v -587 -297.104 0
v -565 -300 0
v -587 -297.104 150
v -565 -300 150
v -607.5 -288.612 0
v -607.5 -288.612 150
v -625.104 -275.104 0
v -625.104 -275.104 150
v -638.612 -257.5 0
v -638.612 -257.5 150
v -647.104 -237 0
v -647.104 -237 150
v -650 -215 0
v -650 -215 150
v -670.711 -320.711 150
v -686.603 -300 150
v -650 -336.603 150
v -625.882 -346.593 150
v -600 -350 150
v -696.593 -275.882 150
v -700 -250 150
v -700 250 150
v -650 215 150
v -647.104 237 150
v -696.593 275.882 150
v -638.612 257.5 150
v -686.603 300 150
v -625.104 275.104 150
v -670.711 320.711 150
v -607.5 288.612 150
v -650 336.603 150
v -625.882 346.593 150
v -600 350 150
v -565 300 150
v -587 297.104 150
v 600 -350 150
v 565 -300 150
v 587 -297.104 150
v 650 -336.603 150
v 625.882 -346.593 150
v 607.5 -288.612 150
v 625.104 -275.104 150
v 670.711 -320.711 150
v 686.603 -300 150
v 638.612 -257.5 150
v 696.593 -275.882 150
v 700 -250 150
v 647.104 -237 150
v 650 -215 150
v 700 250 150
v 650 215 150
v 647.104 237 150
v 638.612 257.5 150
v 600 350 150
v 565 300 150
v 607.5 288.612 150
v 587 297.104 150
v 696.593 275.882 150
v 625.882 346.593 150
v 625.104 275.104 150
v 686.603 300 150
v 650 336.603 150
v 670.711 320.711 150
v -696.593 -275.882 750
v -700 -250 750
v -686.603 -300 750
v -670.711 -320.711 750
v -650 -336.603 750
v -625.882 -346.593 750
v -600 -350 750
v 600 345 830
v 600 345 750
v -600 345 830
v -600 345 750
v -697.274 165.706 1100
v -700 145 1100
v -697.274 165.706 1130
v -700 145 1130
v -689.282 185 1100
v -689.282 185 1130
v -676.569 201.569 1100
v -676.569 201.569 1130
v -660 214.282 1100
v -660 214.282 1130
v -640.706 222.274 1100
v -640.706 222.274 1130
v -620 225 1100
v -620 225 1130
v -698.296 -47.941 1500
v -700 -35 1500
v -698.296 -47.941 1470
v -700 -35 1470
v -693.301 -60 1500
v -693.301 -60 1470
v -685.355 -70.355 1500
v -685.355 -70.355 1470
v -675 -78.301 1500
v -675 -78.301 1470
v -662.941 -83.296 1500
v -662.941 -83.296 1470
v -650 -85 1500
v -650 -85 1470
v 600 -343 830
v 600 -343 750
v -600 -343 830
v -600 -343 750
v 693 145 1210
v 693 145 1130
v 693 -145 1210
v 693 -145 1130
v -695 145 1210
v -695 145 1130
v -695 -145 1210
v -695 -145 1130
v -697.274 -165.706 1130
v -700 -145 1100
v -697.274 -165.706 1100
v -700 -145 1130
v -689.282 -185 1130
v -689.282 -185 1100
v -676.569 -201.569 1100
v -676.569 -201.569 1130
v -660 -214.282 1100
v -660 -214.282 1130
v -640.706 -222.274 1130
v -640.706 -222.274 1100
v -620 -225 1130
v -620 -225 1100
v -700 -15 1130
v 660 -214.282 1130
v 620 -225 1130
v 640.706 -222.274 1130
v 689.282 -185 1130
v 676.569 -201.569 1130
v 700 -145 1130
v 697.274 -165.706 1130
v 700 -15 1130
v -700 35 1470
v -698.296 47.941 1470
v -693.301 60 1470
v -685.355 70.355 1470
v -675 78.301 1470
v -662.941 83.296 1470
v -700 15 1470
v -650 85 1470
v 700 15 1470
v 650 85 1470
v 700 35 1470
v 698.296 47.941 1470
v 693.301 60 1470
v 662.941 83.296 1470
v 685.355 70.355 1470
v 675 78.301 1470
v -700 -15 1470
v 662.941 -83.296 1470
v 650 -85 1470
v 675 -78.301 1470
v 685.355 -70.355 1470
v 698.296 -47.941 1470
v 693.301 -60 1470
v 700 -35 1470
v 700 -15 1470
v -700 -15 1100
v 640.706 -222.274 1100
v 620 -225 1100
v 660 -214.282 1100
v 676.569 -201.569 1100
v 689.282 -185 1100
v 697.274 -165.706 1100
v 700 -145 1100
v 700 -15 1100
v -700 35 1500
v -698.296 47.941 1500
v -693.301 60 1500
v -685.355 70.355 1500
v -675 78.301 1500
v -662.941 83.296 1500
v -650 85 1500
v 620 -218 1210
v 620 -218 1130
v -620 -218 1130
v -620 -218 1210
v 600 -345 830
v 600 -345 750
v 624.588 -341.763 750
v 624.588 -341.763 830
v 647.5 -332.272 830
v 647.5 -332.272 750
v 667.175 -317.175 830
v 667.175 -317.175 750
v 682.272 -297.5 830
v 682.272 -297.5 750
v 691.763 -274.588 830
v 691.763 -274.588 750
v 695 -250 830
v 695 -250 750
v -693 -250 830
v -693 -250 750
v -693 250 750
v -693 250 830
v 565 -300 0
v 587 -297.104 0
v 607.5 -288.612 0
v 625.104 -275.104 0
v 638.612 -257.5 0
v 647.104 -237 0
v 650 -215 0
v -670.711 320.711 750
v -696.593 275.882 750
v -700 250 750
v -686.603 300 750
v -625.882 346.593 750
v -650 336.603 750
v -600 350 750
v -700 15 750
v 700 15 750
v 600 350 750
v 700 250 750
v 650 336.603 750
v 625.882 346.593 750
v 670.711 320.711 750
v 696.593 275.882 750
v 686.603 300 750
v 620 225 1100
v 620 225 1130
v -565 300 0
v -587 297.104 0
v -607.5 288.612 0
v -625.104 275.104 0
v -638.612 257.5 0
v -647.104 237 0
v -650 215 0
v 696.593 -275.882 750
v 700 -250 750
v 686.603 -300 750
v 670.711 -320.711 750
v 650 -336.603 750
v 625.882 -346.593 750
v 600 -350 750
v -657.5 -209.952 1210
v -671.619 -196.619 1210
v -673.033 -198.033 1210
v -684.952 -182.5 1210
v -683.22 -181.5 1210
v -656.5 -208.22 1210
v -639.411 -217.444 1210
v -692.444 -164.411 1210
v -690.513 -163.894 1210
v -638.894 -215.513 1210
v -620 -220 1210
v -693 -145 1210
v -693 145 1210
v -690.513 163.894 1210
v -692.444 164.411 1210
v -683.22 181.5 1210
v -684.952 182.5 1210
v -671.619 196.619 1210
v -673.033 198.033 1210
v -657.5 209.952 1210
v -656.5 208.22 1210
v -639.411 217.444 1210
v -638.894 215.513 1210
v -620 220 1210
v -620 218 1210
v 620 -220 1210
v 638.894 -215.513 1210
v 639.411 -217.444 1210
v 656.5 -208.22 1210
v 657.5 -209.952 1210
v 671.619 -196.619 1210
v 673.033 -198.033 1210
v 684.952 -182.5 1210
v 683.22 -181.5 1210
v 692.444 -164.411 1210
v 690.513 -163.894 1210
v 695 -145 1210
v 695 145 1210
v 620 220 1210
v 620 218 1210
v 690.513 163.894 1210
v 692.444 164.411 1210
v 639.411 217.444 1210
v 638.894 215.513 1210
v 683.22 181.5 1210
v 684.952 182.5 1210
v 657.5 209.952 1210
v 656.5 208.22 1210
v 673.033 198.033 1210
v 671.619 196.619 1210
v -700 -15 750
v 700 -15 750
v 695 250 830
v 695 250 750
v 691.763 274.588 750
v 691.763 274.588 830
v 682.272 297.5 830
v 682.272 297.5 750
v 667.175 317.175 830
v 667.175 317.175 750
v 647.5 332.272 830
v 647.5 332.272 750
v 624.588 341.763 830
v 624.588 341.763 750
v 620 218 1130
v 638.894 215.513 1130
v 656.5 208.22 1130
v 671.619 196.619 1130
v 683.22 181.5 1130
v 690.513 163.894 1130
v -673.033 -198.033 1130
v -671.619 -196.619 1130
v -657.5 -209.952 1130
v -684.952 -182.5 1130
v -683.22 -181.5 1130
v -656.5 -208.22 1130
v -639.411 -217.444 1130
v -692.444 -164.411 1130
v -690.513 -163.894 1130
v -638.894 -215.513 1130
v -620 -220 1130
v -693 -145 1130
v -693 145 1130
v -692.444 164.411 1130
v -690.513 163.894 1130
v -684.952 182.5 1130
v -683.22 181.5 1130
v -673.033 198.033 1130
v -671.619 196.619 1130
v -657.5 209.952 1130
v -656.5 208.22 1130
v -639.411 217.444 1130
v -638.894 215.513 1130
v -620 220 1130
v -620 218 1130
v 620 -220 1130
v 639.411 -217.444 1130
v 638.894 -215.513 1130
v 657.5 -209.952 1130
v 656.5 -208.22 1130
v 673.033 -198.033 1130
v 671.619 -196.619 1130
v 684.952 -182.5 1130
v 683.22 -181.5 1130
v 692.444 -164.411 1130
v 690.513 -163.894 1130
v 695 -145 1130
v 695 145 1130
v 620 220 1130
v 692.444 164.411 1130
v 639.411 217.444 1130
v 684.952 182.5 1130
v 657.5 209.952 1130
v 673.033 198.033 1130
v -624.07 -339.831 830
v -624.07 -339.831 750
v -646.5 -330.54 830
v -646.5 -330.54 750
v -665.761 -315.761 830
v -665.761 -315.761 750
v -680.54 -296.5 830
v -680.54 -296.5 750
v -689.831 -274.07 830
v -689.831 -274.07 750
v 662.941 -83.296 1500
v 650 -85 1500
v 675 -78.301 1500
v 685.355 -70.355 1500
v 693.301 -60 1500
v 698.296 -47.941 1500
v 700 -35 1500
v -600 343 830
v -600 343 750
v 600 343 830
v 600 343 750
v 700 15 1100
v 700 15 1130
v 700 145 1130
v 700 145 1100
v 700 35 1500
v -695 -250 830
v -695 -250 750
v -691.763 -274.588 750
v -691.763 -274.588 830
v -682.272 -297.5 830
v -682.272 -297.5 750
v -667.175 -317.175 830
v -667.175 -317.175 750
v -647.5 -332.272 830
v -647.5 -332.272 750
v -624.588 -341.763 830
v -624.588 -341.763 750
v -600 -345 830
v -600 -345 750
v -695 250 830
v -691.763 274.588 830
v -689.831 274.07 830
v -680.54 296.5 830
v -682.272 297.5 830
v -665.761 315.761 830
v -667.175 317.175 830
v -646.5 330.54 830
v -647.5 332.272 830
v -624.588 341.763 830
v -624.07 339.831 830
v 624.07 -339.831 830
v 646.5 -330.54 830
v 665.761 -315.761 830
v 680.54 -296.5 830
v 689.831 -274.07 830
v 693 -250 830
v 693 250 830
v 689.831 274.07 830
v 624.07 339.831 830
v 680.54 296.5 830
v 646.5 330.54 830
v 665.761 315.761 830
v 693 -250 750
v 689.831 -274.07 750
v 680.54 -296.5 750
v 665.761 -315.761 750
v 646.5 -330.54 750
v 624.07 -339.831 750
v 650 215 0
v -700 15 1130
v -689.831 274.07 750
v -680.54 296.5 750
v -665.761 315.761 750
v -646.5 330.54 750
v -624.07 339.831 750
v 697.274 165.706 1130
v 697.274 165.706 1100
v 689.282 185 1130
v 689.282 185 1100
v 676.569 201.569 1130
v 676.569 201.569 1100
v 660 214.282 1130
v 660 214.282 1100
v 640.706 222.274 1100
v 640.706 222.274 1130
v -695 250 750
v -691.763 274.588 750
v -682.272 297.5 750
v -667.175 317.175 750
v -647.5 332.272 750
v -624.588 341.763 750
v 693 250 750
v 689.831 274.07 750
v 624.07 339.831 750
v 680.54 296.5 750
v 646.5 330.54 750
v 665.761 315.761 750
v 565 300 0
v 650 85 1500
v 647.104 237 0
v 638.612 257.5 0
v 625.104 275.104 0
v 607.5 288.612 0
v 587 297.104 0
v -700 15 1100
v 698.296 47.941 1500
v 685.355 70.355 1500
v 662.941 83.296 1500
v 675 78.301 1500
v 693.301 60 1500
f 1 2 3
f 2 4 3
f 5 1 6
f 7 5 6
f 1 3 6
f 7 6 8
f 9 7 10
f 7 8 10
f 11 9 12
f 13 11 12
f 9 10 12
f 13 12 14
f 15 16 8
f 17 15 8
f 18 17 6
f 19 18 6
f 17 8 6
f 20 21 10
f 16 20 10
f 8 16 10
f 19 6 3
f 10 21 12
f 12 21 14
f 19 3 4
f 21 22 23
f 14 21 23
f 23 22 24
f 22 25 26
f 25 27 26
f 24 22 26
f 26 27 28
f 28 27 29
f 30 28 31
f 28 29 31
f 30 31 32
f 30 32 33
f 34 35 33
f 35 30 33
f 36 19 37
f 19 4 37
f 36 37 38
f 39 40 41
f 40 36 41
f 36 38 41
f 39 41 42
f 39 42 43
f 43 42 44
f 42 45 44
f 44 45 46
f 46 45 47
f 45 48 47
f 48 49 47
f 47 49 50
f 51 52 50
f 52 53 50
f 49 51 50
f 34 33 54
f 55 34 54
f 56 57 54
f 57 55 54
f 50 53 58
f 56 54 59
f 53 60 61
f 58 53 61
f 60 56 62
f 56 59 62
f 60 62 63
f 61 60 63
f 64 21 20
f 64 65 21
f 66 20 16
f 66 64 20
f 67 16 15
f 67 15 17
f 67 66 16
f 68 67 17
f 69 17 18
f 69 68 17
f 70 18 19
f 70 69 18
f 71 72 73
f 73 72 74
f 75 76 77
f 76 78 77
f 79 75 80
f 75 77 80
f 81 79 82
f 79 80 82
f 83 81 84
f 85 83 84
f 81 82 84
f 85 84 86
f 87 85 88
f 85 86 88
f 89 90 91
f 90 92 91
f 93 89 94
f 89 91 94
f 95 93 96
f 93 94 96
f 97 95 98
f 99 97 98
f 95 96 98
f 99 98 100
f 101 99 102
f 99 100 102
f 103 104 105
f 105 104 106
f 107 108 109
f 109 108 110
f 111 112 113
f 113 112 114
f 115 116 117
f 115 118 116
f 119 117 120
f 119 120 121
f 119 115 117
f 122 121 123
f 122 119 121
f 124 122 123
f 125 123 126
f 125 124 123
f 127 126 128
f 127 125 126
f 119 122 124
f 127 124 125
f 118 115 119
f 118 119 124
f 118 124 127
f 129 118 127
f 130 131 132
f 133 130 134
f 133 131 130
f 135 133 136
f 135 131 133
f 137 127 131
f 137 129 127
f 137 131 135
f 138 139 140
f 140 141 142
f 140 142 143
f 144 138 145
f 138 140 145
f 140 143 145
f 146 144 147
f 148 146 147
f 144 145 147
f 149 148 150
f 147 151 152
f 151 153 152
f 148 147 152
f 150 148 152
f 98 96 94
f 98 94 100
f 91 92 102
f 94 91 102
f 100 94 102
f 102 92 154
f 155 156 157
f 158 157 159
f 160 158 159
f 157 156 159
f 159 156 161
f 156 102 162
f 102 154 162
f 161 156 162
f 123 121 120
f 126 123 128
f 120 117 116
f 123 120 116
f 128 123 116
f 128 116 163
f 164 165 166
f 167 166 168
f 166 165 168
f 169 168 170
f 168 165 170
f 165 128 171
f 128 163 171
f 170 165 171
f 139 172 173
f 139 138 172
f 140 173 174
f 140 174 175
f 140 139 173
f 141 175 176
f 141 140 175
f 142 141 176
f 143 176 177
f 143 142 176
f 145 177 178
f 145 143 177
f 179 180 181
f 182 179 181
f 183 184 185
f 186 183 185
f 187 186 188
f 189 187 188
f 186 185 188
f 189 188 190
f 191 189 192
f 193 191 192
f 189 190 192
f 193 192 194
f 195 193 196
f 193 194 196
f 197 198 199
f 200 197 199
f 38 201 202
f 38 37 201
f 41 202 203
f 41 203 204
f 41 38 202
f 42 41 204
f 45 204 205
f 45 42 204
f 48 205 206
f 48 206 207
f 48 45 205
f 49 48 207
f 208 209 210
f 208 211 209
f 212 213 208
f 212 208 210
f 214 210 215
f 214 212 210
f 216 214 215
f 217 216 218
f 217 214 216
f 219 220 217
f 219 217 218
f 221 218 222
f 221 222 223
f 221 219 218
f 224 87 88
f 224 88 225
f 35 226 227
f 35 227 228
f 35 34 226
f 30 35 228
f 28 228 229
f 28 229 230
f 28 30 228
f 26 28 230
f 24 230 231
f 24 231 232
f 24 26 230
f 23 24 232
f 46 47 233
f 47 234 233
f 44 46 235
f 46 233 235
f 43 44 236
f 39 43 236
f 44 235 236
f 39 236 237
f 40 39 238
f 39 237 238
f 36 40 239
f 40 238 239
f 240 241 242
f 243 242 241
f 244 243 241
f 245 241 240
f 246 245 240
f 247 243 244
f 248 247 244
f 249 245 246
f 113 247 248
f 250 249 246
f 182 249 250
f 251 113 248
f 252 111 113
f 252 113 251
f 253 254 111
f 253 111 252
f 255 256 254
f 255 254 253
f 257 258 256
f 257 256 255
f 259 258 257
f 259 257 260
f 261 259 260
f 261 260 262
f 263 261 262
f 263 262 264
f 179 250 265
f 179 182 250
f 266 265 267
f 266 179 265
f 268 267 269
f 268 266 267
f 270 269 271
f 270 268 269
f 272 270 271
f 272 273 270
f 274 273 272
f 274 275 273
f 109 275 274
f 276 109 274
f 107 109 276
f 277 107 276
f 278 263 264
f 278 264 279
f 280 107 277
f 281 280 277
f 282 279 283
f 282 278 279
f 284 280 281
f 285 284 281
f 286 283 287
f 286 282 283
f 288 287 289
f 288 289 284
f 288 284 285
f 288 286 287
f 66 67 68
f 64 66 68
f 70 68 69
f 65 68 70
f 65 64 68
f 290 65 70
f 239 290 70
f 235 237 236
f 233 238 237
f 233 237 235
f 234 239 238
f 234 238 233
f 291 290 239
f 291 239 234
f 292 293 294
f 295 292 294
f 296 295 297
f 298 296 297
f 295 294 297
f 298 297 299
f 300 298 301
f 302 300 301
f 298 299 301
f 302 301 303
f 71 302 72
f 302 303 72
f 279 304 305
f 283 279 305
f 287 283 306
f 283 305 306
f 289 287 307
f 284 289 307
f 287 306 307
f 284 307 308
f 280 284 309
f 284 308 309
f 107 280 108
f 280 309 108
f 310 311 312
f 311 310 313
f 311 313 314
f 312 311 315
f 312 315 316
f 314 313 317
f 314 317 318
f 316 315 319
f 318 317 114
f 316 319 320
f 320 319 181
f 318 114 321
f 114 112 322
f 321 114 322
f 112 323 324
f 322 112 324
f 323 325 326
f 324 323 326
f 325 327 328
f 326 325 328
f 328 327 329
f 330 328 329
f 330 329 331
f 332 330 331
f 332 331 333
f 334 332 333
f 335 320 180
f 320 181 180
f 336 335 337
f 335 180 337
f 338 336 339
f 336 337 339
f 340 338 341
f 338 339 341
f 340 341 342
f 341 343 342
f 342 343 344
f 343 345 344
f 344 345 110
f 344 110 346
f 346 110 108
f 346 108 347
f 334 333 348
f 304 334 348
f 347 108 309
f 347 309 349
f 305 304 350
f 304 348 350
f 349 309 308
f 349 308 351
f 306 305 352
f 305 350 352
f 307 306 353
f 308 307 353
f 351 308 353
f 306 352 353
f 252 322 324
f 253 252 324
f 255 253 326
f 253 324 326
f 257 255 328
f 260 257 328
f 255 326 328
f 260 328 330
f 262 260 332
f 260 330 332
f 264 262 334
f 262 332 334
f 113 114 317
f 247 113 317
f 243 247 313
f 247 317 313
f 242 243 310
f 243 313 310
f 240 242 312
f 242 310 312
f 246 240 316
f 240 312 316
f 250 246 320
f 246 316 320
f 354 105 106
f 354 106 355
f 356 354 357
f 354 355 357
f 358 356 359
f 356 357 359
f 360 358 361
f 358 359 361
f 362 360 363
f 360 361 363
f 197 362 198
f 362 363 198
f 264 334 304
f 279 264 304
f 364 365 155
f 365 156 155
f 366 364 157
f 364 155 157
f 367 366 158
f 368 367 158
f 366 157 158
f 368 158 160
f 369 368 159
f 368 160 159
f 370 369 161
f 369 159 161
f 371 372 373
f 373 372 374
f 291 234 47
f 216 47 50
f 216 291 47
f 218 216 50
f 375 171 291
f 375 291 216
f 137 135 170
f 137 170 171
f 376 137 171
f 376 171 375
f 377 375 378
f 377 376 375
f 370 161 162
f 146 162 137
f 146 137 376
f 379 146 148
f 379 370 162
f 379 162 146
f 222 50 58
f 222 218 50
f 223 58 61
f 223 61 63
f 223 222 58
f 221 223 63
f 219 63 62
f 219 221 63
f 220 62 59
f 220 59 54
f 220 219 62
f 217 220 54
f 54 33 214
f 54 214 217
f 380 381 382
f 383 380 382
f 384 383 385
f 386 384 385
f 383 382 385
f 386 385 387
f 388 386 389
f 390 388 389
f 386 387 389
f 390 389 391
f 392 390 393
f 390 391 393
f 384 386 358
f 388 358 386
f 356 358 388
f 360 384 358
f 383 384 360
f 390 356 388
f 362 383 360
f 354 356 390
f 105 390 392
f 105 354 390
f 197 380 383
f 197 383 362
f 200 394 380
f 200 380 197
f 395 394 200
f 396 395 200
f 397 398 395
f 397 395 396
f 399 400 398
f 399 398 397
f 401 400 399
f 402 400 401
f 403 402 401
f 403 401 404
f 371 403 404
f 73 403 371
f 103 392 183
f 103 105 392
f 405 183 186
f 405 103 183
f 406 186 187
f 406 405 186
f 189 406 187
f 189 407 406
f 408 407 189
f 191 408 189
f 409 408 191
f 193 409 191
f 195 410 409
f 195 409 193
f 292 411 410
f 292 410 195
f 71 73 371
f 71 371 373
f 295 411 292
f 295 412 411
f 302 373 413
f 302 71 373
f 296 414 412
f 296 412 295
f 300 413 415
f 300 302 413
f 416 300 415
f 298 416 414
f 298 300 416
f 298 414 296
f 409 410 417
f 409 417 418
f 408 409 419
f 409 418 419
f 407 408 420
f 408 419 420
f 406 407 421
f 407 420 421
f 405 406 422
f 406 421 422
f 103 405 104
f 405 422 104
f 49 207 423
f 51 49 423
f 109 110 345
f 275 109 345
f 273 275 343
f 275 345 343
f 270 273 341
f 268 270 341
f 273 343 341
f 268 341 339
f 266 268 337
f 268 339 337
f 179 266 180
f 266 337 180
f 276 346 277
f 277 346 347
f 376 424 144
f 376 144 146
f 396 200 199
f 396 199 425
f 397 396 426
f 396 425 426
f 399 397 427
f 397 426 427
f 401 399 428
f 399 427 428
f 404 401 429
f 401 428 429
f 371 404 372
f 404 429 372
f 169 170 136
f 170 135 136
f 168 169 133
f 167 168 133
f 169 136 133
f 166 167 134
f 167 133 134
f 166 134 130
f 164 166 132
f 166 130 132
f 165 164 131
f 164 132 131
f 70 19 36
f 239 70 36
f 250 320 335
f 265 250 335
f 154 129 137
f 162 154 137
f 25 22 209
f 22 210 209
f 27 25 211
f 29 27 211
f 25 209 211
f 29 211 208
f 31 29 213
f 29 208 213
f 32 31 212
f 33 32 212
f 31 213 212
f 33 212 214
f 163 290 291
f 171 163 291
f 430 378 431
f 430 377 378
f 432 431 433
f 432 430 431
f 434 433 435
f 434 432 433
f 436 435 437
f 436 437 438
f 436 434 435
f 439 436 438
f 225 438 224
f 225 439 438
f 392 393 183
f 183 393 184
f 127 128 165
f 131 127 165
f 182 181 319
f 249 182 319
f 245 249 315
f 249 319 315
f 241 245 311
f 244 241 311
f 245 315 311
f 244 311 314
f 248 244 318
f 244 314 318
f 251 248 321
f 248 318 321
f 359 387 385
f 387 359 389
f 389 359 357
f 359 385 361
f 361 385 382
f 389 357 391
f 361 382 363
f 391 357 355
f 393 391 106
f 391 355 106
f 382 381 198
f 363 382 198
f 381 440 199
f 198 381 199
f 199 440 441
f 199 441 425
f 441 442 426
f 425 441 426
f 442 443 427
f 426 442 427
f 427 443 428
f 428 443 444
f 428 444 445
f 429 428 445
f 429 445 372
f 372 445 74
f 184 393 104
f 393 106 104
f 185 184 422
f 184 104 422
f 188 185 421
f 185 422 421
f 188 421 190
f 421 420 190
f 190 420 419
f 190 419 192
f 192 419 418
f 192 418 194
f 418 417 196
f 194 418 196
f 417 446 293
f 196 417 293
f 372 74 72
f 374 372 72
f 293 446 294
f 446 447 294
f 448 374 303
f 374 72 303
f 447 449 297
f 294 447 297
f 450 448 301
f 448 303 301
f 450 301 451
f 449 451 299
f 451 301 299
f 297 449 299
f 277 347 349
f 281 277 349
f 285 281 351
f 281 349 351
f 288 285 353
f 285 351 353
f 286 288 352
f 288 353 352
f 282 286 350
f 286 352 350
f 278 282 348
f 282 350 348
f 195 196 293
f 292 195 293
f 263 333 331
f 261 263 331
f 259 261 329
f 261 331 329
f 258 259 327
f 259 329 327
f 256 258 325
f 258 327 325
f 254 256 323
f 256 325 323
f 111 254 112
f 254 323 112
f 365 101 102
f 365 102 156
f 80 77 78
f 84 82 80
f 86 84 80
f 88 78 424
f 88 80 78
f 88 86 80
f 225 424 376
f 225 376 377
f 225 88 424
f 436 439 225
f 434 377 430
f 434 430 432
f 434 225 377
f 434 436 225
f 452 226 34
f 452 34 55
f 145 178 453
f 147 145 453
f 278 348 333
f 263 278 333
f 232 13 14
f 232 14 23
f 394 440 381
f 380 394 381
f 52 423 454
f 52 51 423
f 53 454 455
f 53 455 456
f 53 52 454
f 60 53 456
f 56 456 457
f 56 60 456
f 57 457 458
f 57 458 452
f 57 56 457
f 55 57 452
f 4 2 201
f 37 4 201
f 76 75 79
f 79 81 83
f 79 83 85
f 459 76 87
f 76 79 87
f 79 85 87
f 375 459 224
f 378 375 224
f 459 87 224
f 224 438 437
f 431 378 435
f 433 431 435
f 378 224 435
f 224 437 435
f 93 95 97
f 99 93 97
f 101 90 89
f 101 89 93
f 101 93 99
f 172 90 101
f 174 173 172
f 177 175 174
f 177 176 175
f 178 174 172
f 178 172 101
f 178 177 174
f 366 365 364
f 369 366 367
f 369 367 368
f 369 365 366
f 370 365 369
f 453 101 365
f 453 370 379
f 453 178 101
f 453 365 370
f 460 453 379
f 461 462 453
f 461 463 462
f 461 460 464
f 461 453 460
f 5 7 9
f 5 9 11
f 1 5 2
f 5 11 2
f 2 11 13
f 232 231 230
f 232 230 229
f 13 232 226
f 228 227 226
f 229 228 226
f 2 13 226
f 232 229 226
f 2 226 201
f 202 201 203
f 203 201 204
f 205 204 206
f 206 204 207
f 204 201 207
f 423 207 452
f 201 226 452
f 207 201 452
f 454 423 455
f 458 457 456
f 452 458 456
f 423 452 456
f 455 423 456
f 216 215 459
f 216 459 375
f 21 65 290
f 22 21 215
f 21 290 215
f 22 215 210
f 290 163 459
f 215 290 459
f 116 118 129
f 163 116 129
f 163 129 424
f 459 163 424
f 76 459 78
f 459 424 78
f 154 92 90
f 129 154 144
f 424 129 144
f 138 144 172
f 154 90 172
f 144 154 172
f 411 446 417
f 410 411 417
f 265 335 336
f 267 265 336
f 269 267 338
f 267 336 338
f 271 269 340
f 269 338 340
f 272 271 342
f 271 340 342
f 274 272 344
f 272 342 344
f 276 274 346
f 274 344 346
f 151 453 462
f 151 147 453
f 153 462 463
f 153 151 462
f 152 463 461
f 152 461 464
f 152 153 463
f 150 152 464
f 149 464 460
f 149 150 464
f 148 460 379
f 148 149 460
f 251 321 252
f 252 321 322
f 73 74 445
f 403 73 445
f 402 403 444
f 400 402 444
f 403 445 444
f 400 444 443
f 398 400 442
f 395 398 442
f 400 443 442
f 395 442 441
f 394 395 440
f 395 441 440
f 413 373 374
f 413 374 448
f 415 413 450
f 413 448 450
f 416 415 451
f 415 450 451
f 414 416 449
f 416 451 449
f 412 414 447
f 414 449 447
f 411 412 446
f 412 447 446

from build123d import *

# Parameters (mm, degrees)
F2_W      = 1300
F2_H      = 600
F3_DEPTH  = 150
F4_W      = 1400
F4_H      = 700
F5_DEPTH  = 600
F6_W      = 1400
F6_H      = 30
F7_DEPTH  = 750
F9_W      = 1400
F9_H      = 450
F10_DEPTH = 30
F11_W     = 1400
F11_H     = 170
F12_DEPTH = 30
F13_R     = 100
F14_R     = 85
F15_R     = 80
F16_R     = 50
F18_DEPTH = 80
F20_DEPTH = 80


with BuildPart() as f3:
    # F2 (on Top) → F3 (new body, through all)
    with BuildSketch(Plane.XY):
        Rectangle(F2_W, F2_H)
    extrude(amount=F3_DEPTH)

    # F4 (on face) → F5 (join, through all)
    with BuildSketch(Plane.XY.offset(150)):
        Rectangle(F4_W, F4_H)
    extrude(amount=F5_DEPTH)

    # F6 (on face) → F7 (join, through all)
    with BuildSketch(Plane.XY.offset(750)):
        Rectangle(F6_W, F6_H)
    extrude(amount=F7_DEPTH)

    # F9 (on plane+point) → F10 (join, through all)
    with BuildSketch(Plane.XY.offset(1100)):
        Rectangle(F9_W, F9_H)
    extrude(amount=F10_DEPTH)

    # F11 (on face) → F12 (join, through all)
    with BuildSketch(Plane.XY.offset(1500)):
        Rectangle(F11_W, F11_H)
    extrude(amount=-F12_DEPTH)

    # F13
    f13_edges = [f3.edges().sort_by_distance(p)[0] for p in [
        (700, -350, 450),
        (-700, -350, 450),
        (700, 350, 450),
        (-700, 350, 450),
    ]]
    fillet(f13_edges, radius=F13_R)

    # F14
    f14_edges = [f3.edges().sort_by_distance(p)[0] for p in [
        (-650, 300, 75),
        (-650, -300, 75),
        (650, -300, 75),
        (650, 300, 75),
    ]]
    fillet(f14_edges, radius=F14_R)

    # F15
    f15_edges = [f3.edges().sort_by_distance(p)[0] for p in [
        (700, 225, 1115),
        (-700, 225, 1115),
        (-700, -225, 1115),
        (700, -225, 1115),
    ]]
    fillet(f15_edges, radius=F15_R)

    # F16
    f16_edges = [f3.edges().sort_by_distance(p)[0] for p in [
        (700, -85, 1485),
        (700, 85, 1485),
        (-700, -85, 1485),
        (-700, 85, 1485),
    ]]
    fillet(f16_edges, radius=F16_R)


with BuildPart() as f18:
    # F17 (on face) → F18 (new body)
    with BuildSketch(Plane.XY.offset(750)):
        with BuildLine():
            ThreePointArc((-600, 345), (-667.1751442127, 317.1751442127), (-695, 250))
            Line((-695, 250), (-695, -250))
            ThreePointArc((-695, -250), (-667.1751442127, -317.1751442127), (-600, -345))
            Line((-600, -345), (600, -345))
            ThreePointArc((600, -345), (667.1751442127, -317.1751442127), (695, -250))
            Line((695, -250), (695, 250))
            ThreePointArc((695, 250), (667.1751442127, 317.1751442127), (600, 345))
            Line((600, 345), (-600, 345))
        make_face()
        with BuildLine():
            ThreePointArc((693, -250), (665.7609306503, -315.7609306503), (600, -343))
            Line((600, -343), (-600, -343))
            ThreePointArc((-600, -343), (-665.7609306503, -315.7609306503), (-693, -250))
            Line((-693, -250), (-693, 250))
            ThreePointArc((-693, 250), (-665.7609306503, 315.7609306503), (-600, 343))
            Line((-600, 343), (600, 343))
            ThreePointArc((600, 343), (665.7609306503, 315.7609306503), (693, 250))
            Line((693, 250), (693, -250))
        make_face(mode=Mode.SUBTRACT)
    extrude(amount=F18_DEPTH)


with BuildPart() as f20:
    # F19 (on face) → F20 (new body)
    with BuildSketch(Plane.XY.offset(1130)):
        with BuildLine():
            ThreePointArc((-620, 220), (-673.033008589, 198.033008589), (-695, 145))
            Line((-695, 145), (-695, 15))
            Line((-695, 15), (-695, -15))
            Line((-695, -15), (-695, -145))
            ThreePointArc((-695, -145), (-673.033008589, -198.033008589), (-620, -220))
            Line((-620, -220), (620, -220))
            ThreePointArc((620, -220), (673.033008589, -198.033008589), (695, -145))
            Line((695, -145), (695, -15))
            Line((695, -15), (695, 15))
            Line((695, 15), (695, 145))
            ThreePointArc((695, 145), (673.033008589, 198.033008589), (620, 220))
            Line((620, 220), (-620, 220))
        make_face()
        with BuildLine():
            Line((693, 145), (693, 15))
            Line((693, 15), (693, -15))
            Line((693, -15), (693, -145))
            ThreePointArc((693, -145), (671.6187950266, -196.6187950266), (620, -218))
            Line((620, -218), (-620, -218))
            ThreePointArc((-620, -218), (-671.6187950266, -196.6187950266), (-693, -145))
            Line((-693, -145), (-693, -15))
            Line((-693, -15), (-693, 15))
            Line((-693, 15), (-693, 145))
            ThreePointArc((-693, 145), (-671.6187950266, 196.6187950266), (-620, 218))
            Line((-620, 218), (620, 218))
            ThreePointArc((620, 218), (671.6187950266, 196.6187950266), (693, 145))
        make_face(mode=Mode.SUBTRACT)
    extrude(amount=F20_DEPTH)


solid = Compound([f3.part, f18.part, f20.part])
